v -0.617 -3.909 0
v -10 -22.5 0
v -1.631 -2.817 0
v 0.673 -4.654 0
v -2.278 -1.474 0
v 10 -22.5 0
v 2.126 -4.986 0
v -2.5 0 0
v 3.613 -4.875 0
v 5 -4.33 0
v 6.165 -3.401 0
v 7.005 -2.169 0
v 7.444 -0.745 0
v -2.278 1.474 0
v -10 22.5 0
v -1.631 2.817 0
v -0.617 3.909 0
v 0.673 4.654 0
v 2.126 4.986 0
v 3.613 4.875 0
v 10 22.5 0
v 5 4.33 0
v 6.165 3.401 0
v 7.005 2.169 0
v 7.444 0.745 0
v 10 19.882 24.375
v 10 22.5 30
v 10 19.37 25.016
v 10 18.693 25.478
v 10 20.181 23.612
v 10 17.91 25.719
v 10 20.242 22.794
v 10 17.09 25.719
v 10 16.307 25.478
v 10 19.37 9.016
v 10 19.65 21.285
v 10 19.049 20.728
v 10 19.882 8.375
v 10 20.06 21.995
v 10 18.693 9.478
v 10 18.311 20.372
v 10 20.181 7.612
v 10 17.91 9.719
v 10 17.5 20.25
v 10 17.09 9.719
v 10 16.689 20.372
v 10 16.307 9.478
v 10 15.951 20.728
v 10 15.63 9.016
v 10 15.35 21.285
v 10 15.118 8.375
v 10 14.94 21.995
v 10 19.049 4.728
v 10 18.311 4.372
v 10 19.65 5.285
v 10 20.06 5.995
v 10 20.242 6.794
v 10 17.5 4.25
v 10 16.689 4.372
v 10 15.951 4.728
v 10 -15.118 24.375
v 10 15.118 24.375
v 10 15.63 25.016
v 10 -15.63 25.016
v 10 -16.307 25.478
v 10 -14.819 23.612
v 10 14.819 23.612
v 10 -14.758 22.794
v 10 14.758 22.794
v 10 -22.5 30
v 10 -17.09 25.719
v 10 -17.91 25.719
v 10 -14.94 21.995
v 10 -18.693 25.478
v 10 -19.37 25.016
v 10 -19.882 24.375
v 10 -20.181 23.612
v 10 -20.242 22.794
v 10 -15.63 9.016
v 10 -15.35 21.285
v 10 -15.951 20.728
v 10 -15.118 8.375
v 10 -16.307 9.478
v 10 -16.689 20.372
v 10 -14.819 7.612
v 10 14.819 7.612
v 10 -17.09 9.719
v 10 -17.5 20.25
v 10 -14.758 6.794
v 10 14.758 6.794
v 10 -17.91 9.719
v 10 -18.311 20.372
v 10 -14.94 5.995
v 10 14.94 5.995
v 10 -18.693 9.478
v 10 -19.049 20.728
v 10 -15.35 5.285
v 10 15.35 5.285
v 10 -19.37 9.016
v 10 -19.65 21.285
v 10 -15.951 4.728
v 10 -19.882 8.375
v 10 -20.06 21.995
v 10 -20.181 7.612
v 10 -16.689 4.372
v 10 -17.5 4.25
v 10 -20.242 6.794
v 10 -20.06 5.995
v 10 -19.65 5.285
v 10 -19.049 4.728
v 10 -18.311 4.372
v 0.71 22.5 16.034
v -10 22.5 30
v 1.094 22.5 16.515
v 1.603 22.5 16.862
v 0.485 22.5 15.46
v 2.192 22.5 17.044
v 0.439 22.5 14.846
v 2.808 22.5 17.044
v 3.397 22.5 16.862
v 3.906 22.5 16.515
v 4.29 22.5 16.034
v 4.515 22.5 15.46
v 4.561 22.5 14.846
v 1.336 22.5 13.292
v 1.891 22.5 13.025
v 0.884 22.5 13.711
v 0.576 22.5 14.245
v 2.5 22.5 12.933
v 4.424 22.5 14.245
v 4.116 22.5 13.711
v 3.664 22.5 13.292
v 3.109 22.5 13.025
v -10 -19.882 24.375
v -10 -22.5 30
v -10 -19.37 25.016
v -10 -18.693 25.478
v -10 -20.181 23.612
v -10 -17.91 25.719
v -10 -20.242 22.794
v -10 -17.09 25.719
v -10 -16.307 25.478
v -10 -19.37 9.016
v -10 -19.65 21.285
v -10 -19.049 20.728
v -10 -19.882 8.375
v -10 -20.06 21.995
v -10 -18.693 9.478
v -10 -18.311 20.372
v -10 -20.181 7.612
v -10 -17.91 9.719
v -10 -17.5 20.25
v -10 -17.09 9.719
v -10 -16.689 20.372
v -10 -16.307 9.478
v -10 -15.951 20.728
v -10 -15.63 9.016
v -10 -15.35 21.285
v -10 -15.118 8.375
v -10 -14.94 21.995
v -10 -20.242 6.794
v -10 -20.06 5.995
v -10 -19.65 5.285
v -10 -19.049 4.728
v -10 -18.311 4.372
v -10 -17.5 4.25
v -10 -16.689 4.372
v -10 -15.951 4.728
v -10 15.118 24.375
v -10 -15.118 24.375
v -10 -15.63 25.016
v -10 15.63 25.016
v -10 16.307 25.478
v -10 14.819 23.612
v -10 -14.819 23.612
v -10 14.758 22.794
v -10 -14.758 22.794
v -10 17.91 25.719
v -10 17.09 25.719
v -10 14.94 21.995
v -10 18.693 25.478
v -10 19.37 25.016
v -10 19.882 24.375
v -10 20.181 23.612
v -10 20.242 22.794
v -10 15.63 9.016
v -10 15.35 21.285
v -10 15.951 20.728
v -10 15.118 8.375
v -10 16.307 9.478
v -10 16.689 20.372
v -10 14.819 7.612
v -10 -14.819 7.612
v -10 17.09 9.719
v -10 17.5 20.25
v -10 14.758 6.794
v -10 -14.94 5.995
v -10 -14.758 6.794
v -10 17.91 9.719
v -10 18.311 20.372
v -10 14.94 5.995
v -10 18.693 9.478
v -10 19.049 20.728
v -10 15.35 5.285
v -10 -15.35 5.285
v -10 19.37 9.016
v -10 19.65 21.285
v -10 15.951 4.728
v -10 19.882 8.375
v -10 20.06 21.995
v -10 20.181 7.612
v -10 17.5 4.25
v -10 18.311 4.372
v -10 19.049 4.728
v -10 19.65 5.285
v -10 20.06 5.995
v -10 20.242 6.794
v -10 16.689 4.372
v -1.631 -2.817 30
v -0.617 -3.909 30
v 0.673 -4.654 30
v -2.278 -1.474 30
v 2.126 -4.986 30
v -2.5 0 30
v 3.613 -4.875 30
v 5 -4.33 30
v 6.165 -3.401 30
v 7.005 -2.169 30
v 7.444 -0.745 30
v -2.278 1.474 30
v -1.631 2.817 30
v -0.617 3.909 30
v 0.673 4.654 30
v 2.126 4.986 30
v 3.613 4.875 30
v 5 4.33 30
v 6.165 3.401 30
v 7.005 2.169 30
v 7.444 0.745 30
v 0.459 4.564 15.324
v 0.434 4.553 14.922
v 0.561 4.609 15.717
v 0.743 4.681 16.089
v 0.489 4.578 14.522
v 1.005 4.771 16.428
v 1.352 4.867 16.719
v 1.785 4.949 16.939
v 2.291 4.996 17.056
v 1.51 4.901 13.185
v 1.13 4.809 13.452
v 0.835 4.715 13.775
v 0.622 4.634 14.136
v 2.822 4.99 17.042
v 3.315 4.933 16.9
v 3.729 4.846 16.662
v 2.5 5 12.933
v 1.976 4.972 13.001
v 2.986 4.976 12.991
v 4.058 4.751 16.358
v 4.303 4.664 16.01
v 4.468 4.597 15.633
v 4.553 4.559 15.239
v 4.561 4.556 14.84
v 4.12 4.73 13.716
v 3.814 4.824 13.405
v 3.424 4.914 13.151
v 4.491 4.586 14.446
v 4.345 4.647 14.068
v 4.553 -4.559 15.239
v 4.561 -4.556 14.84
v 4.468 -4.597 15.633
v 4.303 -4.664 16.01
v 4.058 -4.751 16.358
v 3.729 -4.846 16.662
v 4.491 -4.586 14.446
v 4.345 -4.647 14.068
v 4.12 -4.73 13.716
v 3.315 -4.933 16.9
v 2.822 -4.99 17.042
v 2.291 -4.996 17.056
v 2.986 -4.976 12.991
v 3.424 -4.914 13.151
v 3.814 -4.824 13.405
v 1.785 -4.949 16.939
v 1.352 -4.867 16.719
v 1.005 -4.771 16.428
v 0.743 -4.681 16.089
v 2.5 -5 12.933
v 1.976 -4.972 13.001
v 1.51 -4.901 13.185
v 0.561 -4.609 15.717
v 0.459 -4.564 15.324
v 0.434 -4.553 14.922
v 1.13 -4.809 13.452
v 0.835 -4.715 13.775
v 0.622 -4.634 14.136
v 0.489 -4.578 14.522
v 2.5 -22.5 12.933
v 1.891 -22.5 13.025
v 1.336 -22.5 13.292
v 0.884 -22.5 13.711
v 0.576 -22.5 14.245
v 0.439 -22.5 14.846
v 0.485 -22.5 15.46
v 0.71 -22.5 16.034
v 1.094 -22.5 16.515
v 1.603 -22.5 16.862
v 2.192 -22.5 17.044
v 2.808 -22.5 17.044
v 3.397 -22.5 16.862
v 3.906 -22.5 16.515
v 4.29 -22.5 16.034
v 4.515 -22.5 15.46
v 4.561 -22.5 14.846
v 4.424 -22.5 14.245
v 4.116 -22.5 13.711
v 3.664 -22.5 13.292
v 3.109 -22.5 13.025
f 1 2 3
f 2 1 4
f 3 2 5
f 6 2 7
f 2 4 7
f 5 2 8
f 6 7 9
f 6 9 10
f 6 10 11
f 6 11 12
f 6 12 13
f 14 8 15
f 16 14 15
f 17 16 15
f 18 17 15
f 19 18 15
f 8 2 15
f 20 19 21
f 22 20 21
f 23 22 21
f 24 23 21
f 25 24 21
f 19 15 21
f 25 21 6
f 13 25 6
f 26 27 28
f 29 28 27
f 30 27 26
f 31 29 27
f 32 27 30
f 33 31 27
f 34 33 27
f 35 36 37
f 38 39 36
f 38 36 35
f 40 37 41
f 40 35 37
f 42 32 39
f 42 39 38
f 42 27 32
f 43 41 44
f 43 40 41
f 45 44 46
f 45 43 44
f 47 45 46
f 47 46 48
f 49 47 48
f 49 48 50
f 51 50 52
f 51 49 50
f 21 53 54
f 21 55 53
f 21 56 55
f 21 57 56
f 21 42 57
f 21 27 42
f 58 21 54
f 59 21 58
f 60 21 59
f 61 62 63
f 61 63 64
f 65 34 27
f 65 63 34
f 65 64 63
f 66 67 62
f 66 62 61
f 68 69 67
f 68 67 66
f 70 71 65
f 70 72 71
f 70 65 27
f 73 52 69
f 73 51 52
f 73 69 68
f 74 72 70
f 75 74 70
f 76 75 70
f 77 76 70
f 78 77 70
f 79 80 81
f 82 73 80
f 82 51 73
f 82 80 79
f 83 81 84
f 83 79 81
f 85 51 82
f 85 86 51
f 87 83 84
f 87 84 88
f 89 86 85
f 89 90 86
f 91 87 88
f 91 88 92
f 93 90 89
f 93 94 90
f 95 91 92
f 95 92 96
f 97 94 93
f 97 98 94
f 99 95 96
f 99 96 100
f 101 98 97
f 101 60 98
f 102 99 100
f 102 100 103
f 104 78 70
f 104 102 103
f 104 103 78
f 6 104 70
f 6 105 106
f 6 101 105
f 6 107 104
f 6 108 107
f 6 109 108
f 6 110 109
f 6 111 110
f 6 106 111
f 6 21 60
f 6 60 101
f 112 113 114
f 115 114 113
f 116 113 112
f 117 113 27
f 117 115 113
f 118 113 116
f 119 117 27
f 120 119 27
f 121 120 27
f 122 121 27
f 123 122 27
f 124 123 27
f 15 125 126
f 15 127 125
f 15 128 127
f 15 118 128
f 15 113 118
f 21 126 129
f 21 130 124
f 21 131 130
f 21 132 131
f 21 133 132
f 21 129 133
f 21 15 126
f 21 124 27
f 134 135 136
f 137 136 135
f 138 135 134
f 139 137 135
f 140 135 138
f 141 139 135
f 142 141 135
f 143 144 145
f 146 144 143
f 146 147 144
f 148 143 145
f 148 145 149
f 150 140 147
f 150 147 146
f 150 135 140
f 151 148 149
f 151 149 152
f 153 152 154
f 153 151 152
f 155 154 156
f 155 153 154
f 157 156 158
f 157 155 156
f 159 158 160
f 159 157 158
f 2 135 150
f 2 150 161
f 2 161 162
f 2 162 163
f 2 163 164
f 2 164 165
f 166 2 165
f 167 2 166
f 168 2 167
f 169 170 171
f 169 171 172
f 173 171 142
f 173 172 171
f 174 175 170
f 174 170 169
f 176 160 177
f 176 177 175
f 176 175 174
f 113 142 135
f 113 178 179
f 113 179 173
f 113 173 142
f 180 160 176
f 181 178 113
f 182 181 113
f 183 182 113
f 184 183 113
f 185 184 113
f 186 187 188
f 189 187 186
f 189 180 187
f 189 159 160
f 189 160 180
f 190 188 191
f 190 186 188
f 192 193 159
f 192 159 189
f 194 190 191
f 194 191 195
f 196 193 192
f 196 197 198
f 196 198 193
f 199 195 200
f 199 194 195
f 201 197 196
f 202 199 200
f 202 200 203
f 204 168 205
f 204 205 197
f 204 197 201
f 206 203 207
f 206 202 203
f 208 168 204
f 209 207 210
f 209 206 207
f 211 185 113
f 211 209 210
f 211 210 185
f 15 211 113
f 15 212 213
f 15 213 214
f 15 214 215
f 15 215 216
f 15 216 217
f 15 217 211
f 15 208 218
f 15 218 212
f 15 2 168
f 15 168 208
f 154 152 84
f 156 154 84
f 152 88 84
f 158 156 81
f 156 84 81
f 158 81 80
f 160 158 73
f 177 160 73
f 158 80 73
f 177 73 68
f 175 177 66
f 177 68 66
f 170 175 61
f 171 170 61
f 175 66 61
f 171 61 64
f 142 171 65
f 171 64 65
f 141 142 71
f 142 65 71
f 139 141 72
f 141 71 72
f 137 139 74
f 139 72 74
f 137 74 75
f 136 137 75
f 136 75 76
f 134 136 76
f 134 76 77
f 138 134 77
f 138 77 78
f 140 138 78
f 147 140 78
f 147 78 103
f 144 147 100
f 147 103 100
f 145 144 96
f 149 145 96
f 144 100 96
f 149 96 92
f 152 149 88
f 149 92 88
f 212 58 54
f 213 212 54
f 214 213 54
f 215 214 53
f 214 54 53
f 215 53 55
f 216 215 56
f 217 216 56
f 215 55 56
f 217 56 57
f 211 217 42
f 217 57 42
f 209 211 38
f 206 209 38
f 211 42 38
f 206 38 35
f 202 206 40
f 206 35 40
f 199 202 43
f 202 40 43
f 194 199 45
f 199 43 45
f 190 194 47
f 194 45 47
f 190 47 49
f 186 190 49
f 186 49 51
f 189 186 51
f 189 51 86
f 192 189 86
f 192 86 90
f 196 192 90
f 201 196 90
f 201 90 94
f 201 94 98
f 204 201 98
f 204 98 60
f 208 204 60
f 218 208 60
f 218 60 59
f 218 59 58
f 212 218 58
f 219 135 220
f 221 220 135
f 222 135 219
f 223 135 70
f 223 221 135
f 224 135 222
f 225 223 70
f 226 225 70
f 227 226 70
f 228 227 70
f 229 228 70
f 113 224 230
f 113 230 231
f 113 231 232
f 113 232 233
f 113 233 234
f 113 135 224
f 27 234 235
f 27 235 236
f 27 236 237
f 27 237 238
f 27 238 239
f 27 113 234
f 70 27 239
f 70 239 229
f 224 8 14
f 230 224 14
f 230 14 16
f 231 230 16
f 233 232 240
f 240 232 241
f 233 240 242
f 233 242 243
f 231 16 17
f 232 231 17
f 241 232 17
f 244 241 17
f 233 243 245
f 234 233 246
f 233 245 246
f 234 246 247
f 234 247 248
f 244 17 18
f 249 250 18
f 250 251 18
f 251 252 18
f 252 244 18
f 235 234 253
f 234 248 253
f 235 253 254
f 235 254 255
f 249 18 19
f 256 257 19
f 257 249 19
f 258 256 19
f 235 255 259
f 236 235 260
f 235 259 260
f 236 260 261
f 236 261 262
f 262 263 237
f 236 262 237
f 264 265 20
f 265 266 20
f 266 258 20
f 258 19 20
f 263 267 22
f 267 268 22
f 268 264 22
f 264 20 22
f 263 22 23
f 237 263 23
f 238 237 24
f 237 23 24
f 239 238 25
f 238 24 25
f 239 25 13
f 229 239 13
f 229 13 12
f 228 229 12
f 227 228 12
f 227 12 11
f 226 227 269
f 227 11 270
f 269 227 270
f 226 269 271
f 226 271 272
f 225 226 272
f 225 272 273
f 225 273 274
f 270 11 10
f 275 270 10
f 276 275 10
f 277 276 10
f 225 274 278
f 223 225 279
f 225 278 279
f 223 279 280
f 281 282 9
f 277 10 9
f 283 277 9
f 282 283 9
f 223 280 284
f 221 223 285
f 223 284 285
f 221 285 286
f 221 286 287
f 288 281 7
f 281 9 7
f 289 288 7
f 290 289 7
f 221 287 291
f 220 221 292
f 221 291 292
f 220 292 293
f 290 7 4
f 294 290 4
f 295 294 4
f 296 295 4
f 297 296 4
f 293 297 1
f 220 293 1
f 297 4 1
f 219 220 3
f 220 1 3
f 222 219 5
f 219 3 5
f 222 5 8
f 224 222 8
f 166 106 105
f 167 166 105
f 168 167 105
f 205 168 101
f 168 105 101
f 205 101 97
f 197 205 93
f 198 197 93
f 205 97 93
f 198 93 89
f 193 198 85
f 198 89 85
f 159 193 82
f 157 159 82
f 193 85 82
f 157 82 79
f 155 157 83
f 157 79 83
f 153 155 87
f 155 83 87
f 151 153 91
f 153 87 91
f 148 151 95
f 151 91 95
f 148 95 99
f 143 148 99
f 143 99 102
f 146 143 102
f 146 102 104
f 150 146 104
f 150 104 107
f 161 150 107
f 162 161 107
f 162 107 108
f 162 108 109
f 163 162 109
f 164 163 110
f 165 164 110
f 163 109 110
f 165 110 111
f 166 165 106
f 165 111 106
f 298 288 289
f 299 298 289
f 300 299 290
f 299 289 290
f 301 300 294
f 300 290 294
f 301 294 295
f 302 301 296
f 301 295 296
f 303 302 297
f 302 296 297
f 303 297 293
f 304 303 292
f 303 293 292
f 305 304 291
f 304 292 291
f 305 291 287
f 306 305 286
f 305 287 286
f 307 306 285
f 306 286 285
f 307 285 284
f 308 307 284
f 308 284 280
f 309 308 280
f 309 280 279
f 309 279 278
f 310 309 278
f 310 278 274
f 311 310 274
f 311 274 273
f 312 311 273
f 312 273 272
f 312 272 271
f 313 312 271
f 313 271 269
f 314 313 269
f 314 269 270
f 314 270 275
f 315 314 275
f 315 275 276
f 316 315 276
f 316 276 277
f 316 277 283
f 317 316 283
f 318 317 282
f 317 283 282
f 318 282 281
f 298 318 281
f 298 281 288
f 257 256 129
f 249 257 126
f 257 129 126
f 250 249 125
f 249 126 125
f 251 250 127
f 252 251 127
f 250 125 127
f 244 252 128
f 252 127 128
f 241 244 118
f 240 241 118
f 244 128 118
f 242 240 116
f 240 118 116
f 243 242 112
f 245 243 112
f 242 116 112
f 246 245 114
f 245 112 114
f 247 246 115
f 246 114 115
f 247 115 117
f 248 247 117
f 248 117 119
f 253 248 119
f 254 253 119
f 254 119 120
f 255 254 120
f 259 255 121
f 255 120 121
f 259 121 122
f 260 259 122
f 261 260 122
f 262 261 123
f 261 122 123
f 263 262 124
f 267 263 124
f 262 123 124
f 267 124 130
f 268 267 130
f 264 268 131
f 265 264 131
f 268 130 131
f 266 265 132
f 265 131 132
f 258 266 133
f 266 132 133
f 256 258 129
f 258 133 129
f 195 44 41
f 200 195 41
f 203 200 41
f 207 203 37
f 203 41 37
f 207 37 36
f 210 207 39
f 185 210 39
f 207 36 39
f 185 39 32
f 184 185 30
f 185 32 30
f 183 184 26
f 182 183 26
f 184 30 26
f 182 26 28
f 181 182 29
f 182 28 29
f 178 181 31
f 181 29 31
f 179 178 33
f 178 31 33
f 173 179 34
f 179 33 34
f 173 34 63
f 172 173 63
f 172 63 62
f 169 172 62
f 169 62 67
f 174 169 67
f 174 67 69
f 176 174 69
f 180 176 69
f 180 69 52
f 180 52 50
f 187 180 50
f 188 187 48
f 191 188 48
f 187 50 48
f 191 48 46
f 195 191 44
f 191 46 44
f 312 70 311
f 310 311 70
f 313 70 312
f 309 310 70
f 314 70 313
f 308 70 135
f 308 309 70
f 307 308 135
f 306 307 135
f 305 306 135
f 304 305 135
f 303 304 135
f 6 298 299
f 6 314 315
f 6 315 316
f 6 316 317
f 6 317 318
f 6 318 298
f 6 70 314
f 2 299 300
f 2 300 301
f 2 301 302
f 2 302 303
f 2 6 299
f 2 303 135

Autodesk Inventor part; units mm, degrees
ref_plane "YZ Plane" through (0, 0, 0) normal (1, 0, 0) x (0, 1, 0)
ref_plane "XZ Plane" through (0, 0, 0) normal (0, 1, 0) x (-1, 0, 0)
ref_plane "XY Plane" through (0, 0, 0) normal (0, 0, 1) x (1, 0, 0)
sketch "Sketch1" plane through (0, 0, 0) normal (0, 0, 1) x (1, 0, 0)
  line L0 (-10, 22.5) -> (10, 22.5)
  line L1 (10, 22.5) -> (10, -22.5)
  line L2 (10, -22.5) -> (-10, -22.5)
  line L3 (-10, -22.5) -> (-10, 22.5)
  point P0 (0, 0)
  point P1 (0, 22.5)
  point P2 (-10, 0)
  dimension "d0" = 20
  dimension "d1" = 45
extrude "Extrusion1" add sketch "Sketch1" along normal blind 30
sketch "Sketch3" plane through (0, 0, 0) normal (0, 0, -1) x (-1, 0, 0)
  circle A0 centre (-2.5, 0) radius 5
  line L0 (-10, -22.5) -> (-10, 22.5) projected
  point P0 (-10, 0)
  dimension "d4" = 10
  dimension "d5" = 7.5
extrude "Extrusion2" cut sketch "Sketch3" against normal through all
sketch "Sketch4" plane through (10, -22.5, 0) normal (1, 0, 0) x (0, 0, -1)
  circle A0 centre (-7, 40) radius 2.75
  circle A1 centre (-7, 5) radius 2.75
  line L0 (0, 0) -> (0, 45) projected
  line L1 (0, 45) -> (-30, 45) projected
  line L2 (0, 0) -> (-30, 0) projected
  circle A2 centre (-23, 40) radius 2.75
  circle A3 centre (-23, 5) radius 2.75
  line L3 (-30, 0) -> (-30, 45) projected
  point P0 (0, 22.5)
  dimension "d8" = 5.5
  dimension "d9" = 5.5
  dimension "d10" = 7
  dimension "d11" = 5
  dimension "d12" = 5
  dimension "d13" = 7
  dimension "d16" = 35
  dimension "d17" = 16
extrude "Extrusion3" cut sketch "Sketch4" against normal through all contours A1
pattern_linear "Rectangular Pattern1" count 2 spacing 16 along (0, 0, 1) count 2 spacing 35 along (0, 1, 0) of "Extrusion3"
sketch "Sketch5" plane through (-10, -22.5, 0) normal (0, -1, 0) x (1, 0, 0)
  line L0 (0, 0) -> (0, 30) projected
  line L1 (0, 0) -> (20, 0) projected
  point P0 (12.5, 15)
  point P1 (0, 15)
  point P2 (10, 0)
  dimension "d38" = 12.5
hole "Hole1" at (2.5, -22.5, 15) direction (0, 1, 0) diameter 4.134 end through all thread size "M5x0.8" class "6H" standard "ISO Metric profile"
equation "\"d13\" = d10"
properties part number "0005-10-015 suport tija" material "Wood (Maple)"
